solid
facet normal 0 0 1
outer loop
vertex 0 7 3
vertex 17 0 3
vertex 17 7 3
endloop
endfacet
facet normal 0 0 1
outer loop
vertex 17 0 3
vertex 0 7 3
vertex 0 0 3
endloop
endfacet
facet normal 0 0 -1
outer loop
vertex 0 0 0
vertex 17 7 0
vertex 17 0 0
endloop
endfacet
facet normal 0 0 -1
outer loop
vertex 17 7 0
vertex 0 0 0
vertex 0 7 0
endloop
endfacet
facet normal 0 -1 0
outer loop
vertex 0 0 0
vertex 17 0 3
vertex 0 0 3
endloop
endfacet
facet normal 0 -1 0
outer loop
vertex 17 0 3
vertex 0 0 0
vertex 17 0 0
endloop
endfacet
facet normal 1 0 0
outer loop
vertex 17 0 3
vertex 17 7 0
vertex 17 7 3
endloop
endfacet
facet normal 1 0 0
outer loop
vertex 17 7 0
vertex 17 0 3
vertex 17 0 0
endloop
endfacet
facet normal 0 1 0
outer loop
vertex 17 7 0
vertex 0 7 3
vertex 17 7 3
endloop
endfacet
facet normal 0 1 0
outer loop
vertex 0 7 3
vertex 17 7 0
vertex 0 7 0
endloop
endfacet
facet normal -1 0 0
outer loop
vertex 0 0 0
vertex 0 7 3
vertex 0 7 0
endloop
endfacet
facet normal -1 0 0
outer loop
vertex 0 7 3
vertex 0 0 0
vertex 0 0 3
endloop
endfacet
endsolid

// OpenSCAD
// Generated by SolidPython 1.0.1 on 2020-07-29 00:46:56


cube(size = [17, 7, 3]);
/***********************************************
*********      SolidPython code:      **********
************************************************
 
# import packages: SolidPython
from solid import *
from solid.utils import *
from itertools import chain, combinations, permutations


class Resize:

    def __init__(self, scad_file):
        self.scad_file = scad_file
        #self.scad_file = import_scad(scad_file)
        # cone/cylinder param:
        self.r1 = 0
        self.r2 = 0
        self.h = 0
        # rectangular prism param:
        self.w = 0
        self.l = 0
        # ellipse param:
        self.r = 0

    # import OpenScad code (file name corresponds to shape)


    # classify shape + parameters
    def assign(self, param1, param2, param3):
        if self.scad_file == 'cone.scad':
            self.r1 = param1
            self.r2 = param2
            self.h = param3
        elif self.scad_file == 'cylinder.scad':
            self.r1 = param1
            self.r2 = param2
            self.h = param3
        elif self.scad_file == 'rectangularPrism.scad':
            self.h = param1
            self.l = param2
            self.w = param3
        else:
            self.r = param1
            self.h = param2

    # resize parameters
    def iterate(self):
        x = range(3, 20, 2)
        i = 1
        if self.scad_file == 'cone.scad':
            tempList = list(permutations(x, 2))
            for temp in tempList:
                param1 = temp[0]
                param2 = temp[1]
                filepath = 'produced_scad_files/' + 'cone' + str(param1) + '_' + str(param2) + '_' + '.scad'
                scad_render_to_file(cylinder(h=param1, r1=param2, r2=0), filepath)

        elif self.scad_file == 'cylinder.scad':
            tempList = list(permutations(x, 3))
            for temp in tempList:
                param1 = temp[0]
                param2 = temp[1]
                filepath = 'produced_scad_files/' + 'cylinder' + str(param1) + '_' + str(param2) + '_' + '.scad'
                scad_render_to_file(cylinder(h=param1, r1=param2, r2=param2), filepath)

        elif self.scad_file == 'rectangularPrism.scad':
            tempList = list(permutations(x, 3))
            for temp in tempList:
                param1 = temp[0]
                param2 = temp[1]
                param3 = temp[2]
                filepath = 'produced_scad_files/' + 'rectangularPrism' + str(param1) + '_' + str(param2) + '_' + str(
                    param3) + '.scad'
                scad_render_to_file(cube(size=(param1, param2, param3)), filepath)

        elif self.scad_file == 'ellipse.scad':
            tempList = list(permutations(x, 4))
            for temp in tempList:
                param1 = temp[0]
                param2 = temp[1]
                param3 = temp[2]
                param4 = temp[3]
                filepath = 'produced_scad_files/' + 'ellipse' + str(param1) + '_' + str(param2) + '_' + str(param3) + '_' + str(param4) + '.scad'
                scad_render_to_file(scale([param1, param2, param3])(sphere(r=param4)), filepath)

    def render_to_scadfile(self):
        scad_render_to_file(scad, 'example.scad') 
 
************************************************/
